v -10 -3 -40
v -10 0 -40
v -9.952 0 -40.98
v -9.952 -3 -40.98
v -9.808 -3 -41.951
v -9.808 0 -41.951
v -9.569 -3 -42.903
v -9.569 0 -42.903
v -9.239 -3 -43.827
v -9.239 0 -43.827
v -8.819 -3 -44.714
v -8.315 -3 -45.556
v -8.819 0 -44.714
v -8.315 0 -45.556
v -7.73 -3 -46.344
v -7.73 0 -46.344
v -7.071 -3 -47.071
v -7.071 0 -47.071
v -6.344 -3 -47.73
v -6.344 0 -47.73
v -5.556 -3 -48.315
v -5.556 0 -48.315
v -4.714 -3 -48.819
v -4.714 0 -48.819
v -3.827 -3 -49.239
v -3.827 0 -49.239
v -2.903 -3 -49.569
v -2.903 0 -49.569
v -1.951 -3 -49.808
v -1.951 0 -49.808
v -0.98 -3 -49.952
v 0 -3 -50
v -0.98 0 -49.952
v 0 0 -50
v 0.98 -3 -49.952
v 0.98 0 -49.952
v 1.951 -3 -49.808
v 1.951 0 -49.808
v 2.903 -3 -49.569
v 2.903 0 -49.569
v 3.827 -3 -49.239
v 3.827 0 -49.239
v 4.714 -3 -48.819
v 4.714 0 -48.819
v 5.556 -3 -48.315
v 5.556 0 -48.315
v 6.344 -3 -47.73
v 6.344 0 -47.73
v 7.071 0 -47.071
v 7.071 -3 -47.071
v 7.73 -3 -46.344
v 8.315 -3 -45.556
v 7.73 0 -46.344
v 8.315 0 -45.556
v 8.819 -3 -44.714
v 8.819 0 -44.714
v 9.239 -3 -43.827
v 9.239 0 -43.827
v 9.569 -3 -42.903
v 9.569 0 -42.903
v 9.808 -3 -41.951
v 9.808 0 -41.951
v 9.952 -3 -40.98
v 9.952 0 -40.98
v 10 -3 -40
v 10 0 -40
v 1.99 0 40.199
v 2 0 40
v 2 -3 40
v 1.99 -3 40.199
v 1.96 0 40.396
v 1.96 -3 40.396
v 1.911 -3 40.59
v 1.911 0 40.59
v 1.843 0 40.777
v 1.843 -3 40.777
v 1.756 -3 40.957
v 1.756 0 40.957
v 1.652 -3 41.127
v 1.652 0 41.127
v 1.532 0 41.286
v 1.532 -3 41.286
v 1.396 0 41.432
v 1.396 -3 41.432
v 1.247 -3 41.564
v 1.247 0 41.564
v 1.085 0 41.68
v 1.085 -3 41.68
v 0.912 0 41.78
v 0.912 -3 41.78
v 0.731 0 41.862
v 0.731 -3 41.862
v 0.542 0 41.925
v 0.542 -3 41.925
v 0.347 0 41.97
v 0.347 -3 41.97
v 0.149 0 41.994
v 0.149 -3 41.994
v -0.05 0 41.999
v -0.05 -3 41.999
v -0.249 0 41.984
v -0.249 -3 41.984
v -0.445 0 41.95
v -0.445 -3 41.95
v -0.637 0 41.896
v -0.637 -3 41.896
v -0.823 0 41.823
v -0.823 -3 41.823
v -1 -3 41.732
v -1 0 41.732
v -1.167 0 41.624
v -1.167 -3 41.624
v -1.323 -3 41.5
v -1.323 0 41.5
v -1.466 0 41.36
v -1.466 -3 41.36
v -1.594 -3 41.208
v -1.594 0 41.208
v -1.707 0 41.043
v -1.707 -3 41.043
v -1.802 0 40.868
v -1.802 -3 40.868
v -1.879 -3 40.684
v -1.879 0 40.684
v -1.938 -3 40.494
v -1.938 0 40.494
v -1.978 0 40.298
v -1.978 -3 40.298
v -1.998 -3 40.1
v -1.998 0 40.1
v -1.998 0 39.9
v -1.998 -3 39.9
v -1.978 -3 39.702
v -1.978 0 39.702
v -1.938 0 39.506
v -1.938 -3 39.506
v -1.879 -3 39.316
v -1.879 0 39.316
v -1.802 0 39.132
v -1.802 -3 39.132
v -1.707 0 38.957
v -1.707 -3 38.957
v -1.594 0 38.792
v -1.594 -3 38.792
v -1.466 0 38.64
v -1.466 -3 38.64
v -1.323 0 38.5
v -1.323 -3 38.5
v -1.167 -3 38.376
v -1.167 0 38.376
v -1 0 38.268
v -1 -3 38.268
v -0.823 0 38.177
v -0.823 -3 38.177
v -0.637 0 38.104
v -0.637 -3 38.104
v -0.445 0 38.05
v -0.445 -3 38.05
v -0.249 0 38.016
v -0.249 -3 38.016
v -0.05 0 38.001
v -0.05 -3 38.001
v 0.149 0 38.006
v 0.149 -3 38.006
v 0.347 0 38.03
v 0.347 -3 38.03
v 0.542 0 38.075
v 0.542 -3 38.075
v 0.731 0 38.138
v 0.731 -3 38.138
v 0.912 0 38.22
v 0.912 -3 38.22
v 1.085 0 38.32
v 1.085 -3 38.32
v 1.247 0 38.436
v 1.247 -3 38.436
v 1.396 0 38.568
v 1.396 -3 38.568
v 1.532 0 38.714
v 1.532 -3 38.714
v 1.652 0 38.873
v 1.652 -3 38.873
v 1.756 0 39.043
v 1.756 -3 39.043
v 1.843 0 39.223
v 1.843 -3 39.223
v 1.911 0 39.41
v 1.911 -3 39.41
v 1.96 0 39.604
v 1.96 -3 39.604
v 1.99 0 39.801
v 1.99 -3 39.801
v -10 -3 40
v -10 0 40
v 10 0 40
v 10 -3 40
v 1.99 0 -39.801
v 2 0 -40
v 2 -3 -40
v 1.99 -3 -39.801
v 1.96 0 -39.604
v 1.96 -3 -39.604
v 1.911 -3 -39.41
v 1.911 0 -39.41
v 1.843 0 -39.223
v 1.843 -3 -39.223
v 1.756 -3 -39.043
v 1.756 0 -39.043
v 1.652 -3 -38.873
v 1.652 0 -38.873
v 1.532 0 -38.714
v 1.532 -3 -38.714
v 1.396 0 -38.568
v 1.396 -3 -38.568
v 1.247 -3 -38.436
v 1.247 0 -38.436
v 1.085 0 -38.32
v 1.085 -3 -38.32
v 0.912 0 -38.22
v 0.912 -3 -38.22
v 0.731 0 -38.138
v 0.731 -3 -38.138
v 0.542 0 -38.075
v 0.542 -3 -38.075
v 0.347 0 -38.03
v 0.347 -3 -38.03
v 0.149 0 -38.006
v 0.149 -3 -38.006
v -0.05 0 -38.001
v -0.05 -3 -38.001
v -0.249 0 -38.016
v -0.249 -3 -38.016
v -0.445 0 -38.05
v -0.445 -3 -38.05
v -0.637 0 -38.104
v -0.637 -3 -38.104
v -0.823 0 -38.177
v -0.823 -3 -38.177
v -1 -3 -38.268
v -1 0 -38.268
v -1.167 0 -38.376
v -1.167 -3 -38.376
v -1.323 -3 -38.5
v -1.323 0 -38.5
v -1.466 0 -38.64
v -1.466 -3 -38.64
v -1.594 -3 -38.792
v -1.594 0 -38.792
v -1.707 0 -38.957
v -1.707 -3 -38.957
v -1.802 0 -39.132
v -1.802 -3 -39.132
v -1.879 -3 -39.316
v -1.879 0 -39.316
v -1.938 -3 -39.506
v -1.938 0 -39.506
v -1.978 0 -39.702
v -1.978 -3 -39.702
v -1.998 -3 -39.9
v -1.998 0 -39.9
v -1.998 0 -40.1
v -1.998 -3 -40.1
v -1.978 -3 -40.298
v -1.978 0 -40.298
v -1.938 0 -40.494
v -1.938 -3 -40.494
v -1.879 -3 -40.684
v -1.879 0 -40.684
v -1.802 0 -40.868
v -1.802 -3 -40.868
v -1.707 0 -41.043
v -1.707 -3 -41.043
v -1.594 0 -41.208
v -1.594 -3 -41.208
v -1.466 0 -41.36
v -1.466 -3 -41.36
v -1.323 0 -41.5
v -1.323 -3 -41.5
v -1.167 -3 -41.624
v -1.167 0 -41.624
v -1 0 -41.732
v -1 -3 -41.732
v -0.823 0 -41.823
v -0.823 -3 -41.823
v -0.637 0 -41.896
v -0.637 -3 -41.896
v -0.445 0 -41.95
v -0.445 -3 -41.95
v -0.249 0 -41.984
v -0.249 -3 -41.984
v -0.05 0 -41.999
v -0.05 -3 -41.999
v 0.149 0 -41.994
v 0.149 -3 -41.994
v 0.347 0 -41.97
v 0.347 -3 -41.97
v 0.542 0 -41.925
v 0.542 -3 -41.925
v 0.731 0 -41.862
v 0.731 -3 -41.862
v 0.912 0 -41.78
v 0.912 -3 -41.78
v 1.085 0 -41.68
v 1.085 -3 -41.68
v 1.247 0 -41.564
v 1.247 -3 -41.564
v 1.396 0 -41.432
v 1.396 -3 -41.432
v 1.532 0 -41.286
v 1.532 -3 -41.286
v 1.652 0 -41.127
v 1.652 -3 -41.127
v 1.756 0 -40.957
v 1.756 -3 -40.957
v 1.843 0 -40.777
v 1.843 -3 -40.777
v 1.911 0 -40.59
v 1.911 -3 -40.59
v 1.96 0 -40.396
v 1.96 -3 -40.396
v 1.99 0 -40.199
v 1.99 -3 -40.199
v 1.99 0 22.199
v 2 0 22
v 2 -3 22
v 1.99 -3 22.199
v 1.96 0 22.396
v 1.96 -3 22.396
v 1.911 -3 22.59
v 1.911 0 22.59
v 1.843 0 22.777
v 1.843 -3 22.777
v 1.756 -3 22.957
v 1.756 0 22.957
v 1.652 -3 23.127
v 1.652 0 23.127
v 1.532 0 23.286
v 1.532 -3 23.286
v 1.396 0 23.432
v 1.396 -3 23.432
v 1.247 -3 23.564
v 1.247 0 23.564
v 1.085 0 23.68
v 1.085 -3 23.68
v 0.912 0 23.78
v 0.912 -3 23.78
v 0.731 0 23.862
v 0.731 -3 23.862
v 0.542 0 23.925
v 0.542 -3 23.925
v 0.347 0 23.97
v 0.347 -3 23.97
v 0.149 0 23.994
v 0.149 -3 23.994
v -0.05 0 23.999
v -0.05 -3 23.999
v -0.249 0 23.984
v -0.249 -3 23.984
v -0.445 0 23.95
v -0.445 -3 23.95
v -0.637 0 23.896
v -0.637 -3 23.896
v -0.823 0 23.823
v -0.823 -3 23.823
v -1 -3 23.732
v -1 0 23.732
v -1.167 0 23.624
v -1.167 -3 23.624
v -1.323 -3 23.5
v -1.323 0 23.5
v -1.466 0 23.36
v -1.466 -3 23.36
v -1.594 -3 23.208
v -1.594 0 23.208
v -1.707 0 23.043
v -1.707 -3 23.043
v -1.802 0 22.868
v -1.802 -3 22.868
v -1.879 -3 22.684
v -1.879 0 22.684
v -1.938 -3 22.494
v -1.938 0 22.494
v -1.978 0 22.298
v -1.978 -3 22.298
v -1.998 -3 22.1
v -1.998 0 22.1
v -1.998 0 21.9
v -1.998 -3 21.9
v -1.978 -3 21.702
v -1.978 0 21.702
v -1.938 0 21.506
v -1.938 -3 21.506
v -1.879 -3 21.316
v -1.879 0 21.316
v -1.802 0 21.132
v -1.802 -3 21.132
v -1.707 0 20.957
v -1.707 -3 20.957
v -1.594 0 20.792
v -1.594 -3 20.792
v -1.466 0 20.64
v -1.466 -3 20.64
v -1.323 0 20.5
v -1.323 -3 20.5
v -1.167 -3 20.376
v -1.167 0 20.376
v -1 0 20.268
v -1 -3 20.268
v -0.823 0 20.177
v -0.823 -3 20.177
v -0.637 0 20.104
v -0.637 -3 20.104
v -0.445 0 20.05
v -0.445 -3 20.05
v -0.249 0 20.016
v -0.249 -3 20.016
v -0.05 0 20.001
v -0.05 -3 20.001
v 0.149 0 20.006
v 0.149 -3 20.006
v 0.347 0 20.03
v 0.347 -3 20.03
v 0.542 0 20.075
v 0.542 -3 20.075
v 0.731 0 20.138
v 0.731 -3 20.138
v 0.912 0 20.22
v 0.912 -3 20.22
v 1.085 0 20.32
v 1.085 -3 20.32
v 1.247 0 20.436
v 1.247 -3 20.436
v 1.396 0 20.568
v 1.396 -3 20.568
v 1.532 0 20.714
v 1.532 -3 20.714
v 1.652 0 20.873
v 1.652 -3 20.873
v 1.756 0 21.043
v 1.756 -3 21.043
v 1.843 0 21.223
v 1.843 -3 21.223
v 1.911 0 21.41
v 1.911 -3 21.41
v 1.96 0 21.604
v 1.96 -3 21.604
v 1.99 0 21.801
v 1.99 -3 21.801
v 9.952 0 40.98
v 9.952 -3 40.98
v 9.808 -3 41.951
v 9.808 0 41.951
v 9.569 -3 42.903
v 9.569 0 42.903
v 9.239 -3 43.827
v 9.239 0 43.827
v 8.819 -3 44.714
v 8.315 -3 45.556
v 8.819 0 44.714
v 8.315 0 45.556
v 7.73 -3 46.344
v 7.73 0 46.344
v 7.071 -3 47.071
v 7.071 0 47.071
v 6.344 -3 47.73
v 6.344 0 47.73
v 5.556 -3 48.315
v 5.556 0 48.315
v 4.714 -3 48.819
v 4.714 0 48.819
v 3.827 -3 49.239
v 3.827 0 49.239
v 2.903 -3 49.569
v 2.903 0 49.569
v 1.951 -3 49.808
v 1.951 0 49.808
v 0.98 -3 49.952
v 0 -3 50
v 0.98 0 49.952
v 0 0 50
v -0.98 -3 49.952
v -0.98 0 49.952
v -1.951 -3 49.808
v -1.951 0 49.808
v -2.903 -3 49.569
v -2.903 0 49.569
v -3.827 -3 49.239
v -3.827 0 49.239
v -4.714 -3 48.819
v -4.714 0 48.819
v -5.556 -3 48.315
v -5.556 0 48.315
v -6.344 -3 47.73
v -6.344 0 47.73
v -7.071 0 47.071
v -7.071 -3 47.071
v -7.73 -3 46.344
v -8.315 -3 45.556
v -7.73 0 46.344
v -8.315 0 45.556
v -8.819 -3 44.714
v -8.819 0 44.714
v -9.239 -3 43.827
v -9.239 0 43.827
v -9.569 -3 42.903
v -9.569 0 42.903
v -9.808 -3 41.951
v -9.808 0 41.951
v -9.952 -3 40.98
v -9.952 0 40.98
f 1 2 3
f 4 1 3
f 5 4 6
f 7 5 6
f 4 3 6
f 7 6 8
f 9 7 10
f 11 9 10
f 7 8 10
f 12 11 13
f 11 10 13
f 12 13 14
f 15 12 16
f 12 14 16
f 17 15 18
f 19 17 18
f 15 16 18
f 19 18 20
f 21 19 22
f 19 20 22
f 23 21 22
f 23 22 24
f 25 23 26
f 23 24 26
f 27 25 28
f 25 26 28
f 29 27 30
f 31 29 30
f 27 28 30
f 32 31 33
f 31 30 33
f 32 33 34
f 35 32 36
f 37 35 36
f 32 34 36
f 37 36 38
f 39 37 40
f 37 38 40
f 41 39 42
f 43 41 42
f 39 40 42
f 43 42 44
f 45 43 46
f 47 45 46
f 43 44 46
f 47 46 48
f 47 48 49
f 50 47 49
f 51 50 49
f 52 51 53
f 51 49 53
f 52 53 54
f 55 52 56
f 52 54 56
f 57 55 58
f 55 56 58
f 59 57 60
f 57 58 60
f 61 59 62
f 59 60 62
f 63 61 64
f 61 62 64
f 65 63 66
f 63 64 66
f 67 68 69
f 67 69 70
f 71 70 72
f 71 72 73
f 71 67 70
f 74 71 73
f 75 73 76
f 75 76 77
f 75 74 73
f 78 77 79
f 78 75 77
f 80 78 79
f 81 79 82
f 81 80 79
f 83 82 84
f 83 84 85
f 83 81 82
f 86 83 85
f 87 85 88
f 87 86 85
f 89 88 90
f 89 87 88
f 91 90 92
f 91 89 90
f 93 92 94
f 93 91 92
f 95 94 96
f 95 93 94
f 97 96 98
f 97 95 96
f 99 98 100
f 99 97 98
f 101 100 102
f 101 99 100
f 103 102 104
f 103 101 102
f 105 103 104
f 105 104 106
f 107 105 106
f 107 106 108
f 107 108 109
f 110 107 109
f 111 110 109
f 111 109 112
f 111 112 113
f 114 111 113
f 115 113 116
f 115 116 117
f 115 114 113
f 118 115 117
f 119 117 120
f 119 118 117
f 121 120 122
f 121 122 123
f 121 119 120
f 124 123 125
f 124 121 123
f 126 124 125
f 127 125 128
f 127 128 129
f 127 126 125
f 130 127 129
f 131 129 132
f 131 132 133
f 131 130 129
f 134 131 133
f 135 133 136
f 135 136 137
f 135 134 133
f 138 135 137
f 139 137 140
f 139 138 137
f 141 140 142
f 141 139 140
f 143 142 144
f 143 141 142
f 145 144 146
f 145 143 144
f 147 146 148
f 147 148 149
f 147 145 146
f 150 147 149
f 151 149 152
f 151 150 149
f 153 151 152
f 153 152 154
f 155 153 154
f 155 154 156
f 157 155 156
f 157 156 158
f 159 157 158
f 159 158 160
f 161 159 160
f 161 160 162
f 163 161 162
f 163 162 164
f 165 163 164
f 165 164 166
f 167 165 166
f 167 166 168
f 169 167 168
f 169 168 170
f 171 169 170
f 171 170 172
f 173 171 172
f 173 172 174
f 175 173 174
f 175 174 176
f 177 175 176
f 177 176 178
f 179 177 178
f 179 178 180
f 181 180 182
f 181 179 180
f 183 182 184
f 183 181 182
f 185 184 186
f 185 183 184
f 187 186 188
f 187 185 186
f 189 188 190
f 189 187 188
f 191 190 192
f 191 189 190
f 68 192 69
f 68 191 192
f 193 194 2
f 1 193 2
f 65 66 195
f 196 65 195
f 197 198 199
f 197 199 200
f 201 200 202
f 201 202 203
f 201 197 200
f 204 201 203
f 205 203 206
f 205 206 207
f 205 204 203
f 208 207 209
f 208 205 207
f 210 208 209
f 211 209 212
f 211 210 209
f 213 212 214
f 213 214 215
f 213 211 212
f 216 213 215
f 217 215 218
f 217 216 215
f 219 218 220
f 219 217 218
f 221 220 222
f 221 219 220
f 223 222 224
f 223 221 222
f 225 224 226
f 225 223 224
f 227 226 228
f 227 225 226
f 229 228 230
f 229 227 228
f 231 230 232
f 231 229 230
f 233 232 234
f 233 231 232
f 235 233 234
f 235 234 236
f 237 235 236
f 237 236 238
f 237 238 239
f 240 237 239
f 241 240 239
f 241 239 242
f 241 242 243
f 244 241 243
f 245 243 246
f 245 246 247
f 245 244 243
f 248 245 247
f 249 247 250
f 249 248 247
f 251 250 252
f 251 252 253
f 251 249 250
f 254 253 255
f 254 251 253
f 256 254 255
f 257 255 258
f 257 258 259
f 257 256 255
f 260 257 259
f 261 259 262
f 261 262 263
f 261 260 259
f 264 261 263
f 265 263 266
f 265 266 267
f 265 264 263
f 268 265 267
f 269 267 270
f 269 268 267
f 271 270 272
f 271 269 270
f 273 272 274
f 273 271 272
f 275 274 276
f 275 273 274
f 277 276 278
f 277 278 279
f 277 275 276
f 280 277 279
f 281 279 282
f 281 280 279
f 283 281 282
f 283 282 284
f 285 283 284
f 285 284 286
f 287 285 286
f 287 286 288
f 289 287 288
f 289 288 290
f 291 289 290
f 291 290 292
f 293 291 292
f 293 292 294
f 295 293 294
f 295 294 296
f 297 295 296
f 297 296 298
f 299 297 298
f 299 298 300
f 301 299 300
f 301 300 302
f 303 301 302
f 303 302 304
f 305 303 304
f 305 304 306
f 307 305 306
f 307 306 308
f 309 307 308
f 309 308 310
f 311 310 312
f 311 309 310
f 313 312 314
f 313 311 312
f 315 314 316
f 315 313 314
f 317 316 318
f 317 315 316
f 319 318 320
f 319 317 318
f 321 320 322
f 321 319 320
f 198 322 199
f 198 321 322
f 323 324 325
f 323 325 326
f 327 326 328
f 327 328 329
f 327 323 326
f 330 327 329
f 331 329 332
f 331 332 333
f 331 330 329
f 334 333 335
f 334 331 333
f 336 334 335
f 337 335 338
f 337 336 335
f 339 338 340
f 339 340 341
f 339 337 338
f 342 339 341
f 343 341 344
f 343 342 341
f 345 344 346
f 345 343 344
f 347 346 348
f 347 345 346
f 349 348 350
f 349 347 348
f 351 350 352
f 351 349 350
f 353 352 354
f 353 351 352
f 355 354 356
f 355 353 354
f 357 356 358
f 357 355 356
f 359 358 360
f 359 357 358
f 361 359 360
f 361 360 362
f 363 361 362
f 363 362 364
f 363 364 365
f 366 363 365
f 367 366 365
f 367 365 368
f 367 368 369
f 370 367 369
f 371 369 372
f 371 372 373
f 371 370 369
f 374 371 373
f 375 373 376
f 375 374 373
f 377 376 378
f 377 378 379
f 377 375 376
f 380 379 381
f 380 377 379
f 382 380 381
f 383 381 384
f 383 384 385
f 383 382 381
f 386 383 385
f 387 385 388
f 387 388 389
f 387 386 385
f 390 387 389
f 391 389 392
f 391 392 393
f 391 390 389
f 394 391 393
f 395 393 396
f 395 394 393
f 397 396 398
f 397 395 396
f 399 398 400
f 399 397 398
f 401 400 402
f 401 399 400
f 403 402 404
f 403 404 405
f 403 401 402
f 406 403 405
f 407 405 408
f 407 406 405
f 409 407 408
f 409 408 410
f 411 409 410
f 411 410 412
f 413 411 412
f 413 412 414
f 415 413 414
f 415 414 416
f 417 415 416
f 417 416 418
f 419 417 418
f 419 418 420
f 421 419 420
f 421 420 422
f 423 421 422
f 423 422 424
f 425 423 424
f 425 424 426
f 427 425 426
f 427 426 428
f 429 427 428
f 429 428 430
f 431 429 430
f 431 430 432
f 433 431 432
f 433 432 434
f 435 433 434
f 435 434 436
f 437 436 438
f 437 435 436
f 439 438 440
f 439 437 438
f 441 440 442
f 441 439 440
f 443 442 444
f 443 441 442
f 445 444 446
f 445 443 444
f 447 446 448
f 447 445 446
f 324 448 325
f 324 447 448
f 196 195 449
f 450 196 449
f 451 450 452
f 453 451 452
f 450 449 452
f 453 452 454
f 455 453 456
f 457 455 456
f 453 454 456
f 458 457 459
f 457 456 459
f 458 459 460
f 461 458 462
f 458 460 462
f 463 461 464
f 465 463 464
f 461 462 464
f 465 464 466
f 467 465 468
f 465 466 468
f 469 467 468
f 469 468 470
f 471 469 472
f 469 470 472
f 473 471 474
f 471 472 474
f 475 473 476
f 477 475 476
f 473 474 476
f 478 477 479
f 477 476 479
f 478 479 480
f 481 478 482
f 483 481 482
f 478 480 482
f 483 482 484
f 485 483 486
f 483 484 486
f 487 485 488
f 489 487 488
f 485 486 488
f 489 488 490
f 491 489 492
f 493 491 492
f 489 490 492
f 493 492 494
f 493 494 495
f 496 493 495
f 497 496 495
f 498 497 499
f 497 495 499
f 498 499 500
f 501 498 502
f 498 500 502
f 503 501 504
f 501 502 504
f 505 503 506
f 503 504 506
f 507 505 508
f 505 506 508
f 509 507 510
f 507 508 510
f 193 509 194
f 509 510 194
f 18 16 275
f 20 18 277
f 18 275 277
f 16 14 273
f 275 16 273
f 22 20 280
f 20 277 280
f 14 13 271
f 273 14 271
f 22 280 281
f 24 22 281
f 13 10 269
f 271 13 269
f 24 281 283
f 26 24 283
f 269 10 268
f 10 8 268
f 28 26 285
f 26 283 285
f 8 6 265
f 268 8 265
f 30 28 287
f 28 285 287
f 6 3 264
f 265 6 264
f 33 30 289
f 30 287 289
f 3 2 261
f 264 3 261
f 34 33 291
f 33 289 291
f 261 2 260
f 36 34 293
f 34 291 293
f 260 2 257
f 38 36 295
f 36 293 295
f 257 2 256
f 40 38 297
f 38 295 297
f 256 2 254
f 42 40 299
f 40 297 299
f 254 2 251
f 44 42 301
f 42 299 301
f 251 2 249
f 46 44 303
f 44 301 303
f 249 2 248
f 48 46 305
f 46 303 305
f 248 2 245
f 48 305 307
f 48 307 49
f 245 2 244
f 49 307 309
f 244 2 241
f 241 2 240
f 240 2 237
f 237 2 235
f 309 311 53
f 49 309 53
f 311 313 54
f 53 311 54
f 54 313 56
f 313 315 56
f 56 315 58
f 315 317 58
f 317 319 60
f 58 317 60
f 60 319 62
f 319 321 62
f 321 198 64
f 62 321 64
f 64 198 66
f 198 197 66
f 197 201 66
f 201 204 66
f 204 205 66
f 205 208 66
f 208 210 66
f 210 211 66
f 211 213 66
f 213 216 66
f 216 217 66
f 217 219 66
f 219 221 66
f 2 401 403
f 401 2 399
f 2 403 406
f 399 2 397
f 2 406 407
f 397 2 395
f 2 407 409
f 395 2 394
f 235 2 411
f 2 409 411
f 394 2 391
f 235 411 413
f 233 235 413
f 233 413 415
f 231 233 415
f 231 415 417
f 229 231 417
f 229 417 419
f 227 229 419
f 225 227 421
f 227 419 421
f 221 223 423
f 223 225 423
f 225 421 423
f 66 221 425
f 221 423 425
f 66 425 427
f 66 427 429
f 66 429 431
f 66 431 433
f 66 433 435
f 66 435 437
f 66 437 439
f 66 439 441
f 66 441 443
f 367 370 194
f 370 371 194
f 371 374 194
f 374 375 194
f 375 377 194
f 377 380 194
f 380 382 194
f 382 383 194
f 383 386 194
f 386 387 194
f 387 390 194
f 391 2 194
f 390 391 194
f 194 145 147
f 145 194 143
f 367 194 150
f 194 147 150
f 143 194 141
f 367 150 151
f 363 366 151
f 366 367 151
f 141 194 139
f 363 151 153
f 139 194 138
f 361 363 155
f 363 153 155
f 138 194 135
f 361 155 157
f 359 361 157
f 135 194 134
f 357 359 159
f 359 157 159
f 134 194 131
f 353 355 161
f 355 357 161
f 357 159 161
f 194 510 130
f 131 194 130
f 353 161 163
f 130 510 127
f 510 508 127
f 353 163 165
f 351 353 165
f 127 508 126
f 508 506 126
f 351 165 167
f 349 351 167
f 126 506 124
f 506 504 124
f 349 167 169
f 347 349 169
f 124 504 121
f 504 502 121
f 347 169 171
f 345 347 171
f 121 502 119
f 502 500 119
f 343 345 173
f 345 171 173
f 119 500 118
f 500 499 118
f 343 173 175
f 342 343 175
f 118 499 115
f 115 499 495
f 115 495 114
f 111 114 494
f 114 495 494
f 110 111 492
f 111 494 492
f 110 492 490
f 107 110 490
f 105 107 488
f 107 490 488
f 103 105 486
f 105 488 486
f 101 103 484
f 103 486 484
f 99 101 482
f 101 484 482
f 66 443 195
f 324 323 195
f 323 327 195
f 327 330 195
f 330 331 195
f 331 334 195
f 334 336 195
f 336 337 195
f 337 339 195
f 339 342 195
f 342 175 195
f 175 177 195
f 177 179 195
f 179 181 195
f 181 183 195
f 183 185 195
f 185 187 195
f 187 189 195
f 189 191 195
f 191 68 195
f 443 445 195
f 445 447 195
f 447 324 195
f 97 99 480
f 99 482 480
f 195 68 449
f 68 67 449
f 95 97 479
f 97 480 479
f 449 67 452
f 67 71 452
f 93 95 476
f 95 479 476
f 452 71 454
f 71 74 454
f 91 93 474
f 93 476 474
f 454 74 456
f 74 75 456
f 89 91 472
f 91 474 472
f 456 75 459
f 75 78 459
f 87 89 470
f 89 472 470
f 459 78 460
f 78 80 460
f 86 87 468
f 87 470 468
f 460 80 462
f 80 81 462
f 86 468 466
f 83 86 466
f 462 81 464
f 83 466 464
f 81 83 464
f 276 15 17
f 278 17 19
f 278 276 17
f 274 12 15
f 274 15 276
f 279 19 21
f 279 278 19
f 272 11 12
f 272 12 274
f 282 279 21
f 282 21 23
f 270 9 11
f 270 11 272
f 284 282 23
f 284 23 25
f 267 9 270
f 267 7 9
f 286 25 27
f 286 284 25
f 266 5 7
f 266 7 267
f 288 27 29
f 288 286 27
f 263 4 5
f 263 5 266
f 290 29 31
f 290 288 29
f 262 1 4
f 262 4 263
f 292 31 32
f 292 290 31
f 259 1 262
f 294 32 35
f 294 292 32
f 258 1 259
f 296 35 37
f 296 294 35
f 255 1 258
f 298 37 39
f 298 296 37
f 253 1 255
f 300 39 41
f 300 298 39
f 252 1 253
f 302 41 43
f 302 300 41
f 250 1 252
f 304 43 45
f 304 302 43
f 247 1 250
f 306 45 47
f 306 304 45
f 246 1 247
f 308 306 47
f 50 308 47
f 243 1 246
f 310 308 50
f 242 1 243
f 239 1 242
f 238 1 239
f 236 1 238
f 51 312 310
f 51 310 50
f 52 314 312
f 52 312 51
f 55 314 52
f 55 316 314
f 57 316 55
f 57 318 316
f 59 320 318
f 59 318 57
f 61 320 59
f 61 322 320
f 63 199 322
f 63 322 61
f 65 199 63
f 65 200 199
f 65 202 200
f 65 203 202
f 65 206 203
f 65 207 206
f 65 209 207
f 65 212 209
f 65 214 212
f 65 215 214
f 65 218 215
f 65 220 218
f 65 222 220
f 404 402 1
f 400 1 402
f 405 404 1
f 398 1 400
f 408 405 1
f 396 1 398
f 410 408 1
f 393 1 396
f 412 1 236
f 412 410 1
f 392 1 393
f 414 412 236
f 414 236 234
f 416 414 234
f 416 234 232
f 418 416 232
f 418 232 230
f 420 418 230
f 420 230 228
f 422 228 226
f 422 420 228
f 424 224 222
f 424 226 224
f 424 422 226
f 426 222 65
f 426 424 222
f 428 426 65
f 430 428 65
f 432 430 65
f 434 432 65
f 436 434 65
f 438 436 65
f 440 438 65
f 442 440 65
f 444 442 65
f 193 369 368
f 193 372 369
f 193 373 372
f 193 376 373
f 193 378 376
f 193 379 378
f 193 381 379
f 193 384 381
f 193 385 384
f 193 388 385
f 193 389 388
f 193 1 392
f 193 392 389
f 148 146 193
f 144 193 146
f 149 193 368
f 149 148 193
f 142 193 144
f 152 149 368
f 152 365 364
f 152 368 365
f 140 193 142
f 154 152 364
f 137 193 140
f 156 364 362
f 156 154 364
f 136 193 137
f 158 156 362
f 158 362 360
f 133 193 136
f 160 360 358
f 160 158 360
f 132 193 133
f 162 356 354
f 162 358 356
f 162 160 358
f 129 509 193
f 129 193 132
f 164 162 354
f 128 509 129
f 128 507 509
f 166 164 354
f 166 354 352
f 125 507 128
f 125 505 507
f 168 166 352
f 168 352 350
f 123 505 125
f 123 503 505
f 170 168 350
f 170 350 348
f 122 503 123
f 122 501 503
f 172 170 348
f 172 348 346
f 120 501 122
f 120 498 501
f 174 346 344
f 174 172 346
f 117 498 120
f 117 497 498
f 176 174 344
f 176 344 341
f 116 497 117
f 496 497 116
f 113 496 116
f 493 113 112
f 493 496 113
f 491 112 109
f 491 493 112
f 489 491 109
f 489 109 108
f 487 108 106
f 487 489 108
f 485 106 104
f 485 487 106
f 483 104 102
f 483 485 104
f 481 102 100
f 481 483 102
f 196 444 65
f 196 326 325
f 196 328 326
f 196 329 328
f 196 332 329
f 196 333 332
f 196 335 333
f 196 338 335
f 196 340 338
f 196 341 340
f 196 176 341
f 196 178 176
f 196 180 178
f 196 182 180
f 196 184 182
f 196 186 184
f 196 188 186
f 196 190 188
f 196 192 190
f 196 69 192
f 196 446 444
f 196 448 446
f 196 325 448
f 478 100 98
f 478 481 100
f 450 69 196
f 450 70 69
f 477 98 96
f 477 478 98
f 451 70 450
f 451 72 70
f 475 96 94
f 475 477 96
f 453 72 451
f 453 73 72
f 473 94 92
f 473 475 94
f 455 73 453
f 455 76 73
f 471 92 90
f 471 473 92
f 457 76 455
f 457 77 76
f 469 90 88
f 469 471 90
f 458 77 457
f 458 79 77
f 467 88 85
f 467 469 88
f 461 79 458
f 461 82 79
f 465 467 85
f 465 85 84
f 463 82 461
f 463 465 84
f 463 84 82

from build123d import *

# Parameters (mm, degrees)
F0_R     = 2
F1_DEPTH = 3


with BuildPart() as f1:
    # F0 (on Front) → F1 (new body)
    with BuildSketch(Plane.XZ):
        with BuildLine():
            ThreePointArc((-10, -40), (0, -50), (10, -40))
            Line((10, -40), (10, 40))
            ThreePointArc((10, 40), (0, 50), (-10, 40))
            Line((-10, 40), (-10, -40))
        make_face()
        with Locations((0, -40)):
            Circle(F0_R, mode=Mode.SUBTRACT)
        with Locations((0, 22)):
            Circle(F0_R, mode=Mode.SUBTRACT)
        with Locations((0, 40)):
            Circle(F0_R, mode=Mode.SUBTRACT)
    extrude(amount=F1_DEPTH)


solid = f1.part
